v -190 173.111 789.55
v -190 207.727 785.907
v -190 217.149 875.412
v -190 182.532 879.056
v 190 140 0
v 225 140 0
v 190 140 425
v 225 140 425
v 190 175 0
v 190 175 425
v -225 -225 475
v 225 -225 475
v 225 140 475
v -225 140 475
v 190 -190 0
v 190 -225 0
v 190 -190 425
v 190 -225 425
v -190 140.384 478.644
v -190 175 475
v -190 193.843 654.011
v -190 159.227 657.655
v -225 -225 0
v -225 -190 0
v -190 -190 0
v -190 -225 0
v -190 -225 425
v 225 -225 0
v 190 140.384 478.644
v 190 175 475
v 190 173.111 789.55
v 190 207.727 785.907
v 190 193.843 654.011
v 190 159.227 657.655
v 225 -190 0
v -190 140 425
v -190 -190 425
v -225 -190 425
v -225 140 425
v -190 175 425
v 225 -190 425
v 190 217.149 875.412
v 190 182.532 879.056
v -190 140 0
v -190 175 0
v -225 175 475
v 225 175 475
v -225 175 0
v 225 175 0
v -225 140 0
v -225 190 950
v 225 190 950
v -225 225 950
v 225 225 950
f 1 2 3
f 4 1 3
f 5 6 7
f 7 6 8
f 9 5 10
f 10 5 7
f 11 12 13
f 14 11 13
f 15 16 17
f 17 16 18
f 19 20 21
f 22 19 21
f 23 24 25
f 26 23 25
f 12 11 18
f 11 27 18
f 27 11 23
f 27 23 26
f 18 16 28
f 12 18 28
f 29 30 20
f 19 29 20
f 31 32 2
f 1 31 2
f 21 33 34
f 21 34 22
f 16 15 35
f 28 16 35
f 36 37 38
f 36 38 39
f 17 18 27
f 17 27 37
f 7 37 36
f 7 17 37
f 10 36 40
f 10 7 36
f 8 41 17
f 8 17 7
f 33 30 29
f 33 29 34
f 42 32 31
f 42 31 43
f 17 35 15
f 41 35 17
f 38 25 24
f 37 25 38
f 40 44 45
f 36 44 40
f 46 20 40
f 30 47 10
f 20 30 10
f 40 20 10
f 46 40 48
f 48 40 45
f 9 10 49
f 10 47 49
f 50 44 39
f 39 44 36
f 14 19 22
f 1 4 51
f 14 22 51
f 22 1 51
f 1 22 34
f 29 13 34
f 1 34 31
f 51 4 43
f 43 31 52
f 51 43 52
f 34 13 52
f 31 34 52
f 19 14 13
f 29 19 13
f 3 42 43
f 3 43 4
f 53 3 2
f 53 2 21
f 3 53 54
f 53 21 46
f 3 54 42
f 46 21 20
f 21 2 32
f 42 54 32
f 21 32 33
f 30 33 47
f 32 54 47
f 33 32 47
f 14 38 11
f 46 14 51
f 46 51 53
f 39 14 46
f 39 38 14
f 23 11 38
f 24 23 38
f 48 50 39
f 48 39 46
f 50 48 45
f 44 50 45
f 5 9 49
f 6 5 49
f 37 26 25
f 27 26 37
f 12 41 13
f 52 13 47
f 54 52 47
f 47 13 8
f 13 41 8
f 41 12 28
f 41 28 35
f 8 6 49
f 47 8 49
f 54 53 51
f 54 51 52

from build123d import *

# Parameters (mm, degrees)
F0_W     = 450
F0_H     = 450
F1_DEPTH = 950
F2_W     = 50
F2_H     = 50
F2_W_2   = 330
F2_H_2   = 425
F3_DEPTH = 450.001
F4_W     = 380
F4_H     = 425
F5_DEPTH = 450.001
F6_W     = 380
F6_H     = 180
F6_H_2   = 90
F7_DEPTH = 447.528454


with BuildPart() as f1:
    # F0 (on Top) → F1 (new body)
    with BuildSketch(Plane.XY):
        Rectangle(F0_W, F0_H)
    extrude(amount=F1_DEPTH)

    # F2 (on face) → F3 (cut, through all)
    with BuildSketch(Plane.YZ.offset(225)):
        with Locations((200, 450)):
            Rectangle(F2_W, F2_H)
        Polygon((-225, 475), (140, 475), (190, 950), (-225, 950), align=None)
        with Locations((-25, 212.5)):
            Rectangle(F2_W_2, F2_H_2)
        with Locations((200, 212.5)):
            Rectangle(F2_W, F2_H_2)
        Polygon((175, 475), (225, 475), (225, 950), align=None)
    extrude(amount=-F3_DEPTH, mode=Mode.SUBTRACT)

    # F4 (on face) → F5 (cut, through all)
    with BuildSketch(Plane.XZ.offset(225)):
        with Locations((0, 212.5)):
            Rectangle(F4_W, F4_H)
    extrude(amount=-F5_DEPTH, mode=Mode.SUBTRACT)

    # F6 (on face) → F7 (cut, through all)
    with BuildSketch(Plane(origin=(0, 123.630137, -13.013699), x_dir=(-1, 0, 0), z_dir=(0, 0.994505, -0.104685))):
        with Locations((0, 580.709927)):
            Rectangle(F6_W, F6_H)
        with Locations((0, 848.334257)):
            Rectangle(F6_W, F6_H_2)
    extrude(amount=-F7_DEPTH, mode=Mode.SUBTRACT)


solid = f1.part
